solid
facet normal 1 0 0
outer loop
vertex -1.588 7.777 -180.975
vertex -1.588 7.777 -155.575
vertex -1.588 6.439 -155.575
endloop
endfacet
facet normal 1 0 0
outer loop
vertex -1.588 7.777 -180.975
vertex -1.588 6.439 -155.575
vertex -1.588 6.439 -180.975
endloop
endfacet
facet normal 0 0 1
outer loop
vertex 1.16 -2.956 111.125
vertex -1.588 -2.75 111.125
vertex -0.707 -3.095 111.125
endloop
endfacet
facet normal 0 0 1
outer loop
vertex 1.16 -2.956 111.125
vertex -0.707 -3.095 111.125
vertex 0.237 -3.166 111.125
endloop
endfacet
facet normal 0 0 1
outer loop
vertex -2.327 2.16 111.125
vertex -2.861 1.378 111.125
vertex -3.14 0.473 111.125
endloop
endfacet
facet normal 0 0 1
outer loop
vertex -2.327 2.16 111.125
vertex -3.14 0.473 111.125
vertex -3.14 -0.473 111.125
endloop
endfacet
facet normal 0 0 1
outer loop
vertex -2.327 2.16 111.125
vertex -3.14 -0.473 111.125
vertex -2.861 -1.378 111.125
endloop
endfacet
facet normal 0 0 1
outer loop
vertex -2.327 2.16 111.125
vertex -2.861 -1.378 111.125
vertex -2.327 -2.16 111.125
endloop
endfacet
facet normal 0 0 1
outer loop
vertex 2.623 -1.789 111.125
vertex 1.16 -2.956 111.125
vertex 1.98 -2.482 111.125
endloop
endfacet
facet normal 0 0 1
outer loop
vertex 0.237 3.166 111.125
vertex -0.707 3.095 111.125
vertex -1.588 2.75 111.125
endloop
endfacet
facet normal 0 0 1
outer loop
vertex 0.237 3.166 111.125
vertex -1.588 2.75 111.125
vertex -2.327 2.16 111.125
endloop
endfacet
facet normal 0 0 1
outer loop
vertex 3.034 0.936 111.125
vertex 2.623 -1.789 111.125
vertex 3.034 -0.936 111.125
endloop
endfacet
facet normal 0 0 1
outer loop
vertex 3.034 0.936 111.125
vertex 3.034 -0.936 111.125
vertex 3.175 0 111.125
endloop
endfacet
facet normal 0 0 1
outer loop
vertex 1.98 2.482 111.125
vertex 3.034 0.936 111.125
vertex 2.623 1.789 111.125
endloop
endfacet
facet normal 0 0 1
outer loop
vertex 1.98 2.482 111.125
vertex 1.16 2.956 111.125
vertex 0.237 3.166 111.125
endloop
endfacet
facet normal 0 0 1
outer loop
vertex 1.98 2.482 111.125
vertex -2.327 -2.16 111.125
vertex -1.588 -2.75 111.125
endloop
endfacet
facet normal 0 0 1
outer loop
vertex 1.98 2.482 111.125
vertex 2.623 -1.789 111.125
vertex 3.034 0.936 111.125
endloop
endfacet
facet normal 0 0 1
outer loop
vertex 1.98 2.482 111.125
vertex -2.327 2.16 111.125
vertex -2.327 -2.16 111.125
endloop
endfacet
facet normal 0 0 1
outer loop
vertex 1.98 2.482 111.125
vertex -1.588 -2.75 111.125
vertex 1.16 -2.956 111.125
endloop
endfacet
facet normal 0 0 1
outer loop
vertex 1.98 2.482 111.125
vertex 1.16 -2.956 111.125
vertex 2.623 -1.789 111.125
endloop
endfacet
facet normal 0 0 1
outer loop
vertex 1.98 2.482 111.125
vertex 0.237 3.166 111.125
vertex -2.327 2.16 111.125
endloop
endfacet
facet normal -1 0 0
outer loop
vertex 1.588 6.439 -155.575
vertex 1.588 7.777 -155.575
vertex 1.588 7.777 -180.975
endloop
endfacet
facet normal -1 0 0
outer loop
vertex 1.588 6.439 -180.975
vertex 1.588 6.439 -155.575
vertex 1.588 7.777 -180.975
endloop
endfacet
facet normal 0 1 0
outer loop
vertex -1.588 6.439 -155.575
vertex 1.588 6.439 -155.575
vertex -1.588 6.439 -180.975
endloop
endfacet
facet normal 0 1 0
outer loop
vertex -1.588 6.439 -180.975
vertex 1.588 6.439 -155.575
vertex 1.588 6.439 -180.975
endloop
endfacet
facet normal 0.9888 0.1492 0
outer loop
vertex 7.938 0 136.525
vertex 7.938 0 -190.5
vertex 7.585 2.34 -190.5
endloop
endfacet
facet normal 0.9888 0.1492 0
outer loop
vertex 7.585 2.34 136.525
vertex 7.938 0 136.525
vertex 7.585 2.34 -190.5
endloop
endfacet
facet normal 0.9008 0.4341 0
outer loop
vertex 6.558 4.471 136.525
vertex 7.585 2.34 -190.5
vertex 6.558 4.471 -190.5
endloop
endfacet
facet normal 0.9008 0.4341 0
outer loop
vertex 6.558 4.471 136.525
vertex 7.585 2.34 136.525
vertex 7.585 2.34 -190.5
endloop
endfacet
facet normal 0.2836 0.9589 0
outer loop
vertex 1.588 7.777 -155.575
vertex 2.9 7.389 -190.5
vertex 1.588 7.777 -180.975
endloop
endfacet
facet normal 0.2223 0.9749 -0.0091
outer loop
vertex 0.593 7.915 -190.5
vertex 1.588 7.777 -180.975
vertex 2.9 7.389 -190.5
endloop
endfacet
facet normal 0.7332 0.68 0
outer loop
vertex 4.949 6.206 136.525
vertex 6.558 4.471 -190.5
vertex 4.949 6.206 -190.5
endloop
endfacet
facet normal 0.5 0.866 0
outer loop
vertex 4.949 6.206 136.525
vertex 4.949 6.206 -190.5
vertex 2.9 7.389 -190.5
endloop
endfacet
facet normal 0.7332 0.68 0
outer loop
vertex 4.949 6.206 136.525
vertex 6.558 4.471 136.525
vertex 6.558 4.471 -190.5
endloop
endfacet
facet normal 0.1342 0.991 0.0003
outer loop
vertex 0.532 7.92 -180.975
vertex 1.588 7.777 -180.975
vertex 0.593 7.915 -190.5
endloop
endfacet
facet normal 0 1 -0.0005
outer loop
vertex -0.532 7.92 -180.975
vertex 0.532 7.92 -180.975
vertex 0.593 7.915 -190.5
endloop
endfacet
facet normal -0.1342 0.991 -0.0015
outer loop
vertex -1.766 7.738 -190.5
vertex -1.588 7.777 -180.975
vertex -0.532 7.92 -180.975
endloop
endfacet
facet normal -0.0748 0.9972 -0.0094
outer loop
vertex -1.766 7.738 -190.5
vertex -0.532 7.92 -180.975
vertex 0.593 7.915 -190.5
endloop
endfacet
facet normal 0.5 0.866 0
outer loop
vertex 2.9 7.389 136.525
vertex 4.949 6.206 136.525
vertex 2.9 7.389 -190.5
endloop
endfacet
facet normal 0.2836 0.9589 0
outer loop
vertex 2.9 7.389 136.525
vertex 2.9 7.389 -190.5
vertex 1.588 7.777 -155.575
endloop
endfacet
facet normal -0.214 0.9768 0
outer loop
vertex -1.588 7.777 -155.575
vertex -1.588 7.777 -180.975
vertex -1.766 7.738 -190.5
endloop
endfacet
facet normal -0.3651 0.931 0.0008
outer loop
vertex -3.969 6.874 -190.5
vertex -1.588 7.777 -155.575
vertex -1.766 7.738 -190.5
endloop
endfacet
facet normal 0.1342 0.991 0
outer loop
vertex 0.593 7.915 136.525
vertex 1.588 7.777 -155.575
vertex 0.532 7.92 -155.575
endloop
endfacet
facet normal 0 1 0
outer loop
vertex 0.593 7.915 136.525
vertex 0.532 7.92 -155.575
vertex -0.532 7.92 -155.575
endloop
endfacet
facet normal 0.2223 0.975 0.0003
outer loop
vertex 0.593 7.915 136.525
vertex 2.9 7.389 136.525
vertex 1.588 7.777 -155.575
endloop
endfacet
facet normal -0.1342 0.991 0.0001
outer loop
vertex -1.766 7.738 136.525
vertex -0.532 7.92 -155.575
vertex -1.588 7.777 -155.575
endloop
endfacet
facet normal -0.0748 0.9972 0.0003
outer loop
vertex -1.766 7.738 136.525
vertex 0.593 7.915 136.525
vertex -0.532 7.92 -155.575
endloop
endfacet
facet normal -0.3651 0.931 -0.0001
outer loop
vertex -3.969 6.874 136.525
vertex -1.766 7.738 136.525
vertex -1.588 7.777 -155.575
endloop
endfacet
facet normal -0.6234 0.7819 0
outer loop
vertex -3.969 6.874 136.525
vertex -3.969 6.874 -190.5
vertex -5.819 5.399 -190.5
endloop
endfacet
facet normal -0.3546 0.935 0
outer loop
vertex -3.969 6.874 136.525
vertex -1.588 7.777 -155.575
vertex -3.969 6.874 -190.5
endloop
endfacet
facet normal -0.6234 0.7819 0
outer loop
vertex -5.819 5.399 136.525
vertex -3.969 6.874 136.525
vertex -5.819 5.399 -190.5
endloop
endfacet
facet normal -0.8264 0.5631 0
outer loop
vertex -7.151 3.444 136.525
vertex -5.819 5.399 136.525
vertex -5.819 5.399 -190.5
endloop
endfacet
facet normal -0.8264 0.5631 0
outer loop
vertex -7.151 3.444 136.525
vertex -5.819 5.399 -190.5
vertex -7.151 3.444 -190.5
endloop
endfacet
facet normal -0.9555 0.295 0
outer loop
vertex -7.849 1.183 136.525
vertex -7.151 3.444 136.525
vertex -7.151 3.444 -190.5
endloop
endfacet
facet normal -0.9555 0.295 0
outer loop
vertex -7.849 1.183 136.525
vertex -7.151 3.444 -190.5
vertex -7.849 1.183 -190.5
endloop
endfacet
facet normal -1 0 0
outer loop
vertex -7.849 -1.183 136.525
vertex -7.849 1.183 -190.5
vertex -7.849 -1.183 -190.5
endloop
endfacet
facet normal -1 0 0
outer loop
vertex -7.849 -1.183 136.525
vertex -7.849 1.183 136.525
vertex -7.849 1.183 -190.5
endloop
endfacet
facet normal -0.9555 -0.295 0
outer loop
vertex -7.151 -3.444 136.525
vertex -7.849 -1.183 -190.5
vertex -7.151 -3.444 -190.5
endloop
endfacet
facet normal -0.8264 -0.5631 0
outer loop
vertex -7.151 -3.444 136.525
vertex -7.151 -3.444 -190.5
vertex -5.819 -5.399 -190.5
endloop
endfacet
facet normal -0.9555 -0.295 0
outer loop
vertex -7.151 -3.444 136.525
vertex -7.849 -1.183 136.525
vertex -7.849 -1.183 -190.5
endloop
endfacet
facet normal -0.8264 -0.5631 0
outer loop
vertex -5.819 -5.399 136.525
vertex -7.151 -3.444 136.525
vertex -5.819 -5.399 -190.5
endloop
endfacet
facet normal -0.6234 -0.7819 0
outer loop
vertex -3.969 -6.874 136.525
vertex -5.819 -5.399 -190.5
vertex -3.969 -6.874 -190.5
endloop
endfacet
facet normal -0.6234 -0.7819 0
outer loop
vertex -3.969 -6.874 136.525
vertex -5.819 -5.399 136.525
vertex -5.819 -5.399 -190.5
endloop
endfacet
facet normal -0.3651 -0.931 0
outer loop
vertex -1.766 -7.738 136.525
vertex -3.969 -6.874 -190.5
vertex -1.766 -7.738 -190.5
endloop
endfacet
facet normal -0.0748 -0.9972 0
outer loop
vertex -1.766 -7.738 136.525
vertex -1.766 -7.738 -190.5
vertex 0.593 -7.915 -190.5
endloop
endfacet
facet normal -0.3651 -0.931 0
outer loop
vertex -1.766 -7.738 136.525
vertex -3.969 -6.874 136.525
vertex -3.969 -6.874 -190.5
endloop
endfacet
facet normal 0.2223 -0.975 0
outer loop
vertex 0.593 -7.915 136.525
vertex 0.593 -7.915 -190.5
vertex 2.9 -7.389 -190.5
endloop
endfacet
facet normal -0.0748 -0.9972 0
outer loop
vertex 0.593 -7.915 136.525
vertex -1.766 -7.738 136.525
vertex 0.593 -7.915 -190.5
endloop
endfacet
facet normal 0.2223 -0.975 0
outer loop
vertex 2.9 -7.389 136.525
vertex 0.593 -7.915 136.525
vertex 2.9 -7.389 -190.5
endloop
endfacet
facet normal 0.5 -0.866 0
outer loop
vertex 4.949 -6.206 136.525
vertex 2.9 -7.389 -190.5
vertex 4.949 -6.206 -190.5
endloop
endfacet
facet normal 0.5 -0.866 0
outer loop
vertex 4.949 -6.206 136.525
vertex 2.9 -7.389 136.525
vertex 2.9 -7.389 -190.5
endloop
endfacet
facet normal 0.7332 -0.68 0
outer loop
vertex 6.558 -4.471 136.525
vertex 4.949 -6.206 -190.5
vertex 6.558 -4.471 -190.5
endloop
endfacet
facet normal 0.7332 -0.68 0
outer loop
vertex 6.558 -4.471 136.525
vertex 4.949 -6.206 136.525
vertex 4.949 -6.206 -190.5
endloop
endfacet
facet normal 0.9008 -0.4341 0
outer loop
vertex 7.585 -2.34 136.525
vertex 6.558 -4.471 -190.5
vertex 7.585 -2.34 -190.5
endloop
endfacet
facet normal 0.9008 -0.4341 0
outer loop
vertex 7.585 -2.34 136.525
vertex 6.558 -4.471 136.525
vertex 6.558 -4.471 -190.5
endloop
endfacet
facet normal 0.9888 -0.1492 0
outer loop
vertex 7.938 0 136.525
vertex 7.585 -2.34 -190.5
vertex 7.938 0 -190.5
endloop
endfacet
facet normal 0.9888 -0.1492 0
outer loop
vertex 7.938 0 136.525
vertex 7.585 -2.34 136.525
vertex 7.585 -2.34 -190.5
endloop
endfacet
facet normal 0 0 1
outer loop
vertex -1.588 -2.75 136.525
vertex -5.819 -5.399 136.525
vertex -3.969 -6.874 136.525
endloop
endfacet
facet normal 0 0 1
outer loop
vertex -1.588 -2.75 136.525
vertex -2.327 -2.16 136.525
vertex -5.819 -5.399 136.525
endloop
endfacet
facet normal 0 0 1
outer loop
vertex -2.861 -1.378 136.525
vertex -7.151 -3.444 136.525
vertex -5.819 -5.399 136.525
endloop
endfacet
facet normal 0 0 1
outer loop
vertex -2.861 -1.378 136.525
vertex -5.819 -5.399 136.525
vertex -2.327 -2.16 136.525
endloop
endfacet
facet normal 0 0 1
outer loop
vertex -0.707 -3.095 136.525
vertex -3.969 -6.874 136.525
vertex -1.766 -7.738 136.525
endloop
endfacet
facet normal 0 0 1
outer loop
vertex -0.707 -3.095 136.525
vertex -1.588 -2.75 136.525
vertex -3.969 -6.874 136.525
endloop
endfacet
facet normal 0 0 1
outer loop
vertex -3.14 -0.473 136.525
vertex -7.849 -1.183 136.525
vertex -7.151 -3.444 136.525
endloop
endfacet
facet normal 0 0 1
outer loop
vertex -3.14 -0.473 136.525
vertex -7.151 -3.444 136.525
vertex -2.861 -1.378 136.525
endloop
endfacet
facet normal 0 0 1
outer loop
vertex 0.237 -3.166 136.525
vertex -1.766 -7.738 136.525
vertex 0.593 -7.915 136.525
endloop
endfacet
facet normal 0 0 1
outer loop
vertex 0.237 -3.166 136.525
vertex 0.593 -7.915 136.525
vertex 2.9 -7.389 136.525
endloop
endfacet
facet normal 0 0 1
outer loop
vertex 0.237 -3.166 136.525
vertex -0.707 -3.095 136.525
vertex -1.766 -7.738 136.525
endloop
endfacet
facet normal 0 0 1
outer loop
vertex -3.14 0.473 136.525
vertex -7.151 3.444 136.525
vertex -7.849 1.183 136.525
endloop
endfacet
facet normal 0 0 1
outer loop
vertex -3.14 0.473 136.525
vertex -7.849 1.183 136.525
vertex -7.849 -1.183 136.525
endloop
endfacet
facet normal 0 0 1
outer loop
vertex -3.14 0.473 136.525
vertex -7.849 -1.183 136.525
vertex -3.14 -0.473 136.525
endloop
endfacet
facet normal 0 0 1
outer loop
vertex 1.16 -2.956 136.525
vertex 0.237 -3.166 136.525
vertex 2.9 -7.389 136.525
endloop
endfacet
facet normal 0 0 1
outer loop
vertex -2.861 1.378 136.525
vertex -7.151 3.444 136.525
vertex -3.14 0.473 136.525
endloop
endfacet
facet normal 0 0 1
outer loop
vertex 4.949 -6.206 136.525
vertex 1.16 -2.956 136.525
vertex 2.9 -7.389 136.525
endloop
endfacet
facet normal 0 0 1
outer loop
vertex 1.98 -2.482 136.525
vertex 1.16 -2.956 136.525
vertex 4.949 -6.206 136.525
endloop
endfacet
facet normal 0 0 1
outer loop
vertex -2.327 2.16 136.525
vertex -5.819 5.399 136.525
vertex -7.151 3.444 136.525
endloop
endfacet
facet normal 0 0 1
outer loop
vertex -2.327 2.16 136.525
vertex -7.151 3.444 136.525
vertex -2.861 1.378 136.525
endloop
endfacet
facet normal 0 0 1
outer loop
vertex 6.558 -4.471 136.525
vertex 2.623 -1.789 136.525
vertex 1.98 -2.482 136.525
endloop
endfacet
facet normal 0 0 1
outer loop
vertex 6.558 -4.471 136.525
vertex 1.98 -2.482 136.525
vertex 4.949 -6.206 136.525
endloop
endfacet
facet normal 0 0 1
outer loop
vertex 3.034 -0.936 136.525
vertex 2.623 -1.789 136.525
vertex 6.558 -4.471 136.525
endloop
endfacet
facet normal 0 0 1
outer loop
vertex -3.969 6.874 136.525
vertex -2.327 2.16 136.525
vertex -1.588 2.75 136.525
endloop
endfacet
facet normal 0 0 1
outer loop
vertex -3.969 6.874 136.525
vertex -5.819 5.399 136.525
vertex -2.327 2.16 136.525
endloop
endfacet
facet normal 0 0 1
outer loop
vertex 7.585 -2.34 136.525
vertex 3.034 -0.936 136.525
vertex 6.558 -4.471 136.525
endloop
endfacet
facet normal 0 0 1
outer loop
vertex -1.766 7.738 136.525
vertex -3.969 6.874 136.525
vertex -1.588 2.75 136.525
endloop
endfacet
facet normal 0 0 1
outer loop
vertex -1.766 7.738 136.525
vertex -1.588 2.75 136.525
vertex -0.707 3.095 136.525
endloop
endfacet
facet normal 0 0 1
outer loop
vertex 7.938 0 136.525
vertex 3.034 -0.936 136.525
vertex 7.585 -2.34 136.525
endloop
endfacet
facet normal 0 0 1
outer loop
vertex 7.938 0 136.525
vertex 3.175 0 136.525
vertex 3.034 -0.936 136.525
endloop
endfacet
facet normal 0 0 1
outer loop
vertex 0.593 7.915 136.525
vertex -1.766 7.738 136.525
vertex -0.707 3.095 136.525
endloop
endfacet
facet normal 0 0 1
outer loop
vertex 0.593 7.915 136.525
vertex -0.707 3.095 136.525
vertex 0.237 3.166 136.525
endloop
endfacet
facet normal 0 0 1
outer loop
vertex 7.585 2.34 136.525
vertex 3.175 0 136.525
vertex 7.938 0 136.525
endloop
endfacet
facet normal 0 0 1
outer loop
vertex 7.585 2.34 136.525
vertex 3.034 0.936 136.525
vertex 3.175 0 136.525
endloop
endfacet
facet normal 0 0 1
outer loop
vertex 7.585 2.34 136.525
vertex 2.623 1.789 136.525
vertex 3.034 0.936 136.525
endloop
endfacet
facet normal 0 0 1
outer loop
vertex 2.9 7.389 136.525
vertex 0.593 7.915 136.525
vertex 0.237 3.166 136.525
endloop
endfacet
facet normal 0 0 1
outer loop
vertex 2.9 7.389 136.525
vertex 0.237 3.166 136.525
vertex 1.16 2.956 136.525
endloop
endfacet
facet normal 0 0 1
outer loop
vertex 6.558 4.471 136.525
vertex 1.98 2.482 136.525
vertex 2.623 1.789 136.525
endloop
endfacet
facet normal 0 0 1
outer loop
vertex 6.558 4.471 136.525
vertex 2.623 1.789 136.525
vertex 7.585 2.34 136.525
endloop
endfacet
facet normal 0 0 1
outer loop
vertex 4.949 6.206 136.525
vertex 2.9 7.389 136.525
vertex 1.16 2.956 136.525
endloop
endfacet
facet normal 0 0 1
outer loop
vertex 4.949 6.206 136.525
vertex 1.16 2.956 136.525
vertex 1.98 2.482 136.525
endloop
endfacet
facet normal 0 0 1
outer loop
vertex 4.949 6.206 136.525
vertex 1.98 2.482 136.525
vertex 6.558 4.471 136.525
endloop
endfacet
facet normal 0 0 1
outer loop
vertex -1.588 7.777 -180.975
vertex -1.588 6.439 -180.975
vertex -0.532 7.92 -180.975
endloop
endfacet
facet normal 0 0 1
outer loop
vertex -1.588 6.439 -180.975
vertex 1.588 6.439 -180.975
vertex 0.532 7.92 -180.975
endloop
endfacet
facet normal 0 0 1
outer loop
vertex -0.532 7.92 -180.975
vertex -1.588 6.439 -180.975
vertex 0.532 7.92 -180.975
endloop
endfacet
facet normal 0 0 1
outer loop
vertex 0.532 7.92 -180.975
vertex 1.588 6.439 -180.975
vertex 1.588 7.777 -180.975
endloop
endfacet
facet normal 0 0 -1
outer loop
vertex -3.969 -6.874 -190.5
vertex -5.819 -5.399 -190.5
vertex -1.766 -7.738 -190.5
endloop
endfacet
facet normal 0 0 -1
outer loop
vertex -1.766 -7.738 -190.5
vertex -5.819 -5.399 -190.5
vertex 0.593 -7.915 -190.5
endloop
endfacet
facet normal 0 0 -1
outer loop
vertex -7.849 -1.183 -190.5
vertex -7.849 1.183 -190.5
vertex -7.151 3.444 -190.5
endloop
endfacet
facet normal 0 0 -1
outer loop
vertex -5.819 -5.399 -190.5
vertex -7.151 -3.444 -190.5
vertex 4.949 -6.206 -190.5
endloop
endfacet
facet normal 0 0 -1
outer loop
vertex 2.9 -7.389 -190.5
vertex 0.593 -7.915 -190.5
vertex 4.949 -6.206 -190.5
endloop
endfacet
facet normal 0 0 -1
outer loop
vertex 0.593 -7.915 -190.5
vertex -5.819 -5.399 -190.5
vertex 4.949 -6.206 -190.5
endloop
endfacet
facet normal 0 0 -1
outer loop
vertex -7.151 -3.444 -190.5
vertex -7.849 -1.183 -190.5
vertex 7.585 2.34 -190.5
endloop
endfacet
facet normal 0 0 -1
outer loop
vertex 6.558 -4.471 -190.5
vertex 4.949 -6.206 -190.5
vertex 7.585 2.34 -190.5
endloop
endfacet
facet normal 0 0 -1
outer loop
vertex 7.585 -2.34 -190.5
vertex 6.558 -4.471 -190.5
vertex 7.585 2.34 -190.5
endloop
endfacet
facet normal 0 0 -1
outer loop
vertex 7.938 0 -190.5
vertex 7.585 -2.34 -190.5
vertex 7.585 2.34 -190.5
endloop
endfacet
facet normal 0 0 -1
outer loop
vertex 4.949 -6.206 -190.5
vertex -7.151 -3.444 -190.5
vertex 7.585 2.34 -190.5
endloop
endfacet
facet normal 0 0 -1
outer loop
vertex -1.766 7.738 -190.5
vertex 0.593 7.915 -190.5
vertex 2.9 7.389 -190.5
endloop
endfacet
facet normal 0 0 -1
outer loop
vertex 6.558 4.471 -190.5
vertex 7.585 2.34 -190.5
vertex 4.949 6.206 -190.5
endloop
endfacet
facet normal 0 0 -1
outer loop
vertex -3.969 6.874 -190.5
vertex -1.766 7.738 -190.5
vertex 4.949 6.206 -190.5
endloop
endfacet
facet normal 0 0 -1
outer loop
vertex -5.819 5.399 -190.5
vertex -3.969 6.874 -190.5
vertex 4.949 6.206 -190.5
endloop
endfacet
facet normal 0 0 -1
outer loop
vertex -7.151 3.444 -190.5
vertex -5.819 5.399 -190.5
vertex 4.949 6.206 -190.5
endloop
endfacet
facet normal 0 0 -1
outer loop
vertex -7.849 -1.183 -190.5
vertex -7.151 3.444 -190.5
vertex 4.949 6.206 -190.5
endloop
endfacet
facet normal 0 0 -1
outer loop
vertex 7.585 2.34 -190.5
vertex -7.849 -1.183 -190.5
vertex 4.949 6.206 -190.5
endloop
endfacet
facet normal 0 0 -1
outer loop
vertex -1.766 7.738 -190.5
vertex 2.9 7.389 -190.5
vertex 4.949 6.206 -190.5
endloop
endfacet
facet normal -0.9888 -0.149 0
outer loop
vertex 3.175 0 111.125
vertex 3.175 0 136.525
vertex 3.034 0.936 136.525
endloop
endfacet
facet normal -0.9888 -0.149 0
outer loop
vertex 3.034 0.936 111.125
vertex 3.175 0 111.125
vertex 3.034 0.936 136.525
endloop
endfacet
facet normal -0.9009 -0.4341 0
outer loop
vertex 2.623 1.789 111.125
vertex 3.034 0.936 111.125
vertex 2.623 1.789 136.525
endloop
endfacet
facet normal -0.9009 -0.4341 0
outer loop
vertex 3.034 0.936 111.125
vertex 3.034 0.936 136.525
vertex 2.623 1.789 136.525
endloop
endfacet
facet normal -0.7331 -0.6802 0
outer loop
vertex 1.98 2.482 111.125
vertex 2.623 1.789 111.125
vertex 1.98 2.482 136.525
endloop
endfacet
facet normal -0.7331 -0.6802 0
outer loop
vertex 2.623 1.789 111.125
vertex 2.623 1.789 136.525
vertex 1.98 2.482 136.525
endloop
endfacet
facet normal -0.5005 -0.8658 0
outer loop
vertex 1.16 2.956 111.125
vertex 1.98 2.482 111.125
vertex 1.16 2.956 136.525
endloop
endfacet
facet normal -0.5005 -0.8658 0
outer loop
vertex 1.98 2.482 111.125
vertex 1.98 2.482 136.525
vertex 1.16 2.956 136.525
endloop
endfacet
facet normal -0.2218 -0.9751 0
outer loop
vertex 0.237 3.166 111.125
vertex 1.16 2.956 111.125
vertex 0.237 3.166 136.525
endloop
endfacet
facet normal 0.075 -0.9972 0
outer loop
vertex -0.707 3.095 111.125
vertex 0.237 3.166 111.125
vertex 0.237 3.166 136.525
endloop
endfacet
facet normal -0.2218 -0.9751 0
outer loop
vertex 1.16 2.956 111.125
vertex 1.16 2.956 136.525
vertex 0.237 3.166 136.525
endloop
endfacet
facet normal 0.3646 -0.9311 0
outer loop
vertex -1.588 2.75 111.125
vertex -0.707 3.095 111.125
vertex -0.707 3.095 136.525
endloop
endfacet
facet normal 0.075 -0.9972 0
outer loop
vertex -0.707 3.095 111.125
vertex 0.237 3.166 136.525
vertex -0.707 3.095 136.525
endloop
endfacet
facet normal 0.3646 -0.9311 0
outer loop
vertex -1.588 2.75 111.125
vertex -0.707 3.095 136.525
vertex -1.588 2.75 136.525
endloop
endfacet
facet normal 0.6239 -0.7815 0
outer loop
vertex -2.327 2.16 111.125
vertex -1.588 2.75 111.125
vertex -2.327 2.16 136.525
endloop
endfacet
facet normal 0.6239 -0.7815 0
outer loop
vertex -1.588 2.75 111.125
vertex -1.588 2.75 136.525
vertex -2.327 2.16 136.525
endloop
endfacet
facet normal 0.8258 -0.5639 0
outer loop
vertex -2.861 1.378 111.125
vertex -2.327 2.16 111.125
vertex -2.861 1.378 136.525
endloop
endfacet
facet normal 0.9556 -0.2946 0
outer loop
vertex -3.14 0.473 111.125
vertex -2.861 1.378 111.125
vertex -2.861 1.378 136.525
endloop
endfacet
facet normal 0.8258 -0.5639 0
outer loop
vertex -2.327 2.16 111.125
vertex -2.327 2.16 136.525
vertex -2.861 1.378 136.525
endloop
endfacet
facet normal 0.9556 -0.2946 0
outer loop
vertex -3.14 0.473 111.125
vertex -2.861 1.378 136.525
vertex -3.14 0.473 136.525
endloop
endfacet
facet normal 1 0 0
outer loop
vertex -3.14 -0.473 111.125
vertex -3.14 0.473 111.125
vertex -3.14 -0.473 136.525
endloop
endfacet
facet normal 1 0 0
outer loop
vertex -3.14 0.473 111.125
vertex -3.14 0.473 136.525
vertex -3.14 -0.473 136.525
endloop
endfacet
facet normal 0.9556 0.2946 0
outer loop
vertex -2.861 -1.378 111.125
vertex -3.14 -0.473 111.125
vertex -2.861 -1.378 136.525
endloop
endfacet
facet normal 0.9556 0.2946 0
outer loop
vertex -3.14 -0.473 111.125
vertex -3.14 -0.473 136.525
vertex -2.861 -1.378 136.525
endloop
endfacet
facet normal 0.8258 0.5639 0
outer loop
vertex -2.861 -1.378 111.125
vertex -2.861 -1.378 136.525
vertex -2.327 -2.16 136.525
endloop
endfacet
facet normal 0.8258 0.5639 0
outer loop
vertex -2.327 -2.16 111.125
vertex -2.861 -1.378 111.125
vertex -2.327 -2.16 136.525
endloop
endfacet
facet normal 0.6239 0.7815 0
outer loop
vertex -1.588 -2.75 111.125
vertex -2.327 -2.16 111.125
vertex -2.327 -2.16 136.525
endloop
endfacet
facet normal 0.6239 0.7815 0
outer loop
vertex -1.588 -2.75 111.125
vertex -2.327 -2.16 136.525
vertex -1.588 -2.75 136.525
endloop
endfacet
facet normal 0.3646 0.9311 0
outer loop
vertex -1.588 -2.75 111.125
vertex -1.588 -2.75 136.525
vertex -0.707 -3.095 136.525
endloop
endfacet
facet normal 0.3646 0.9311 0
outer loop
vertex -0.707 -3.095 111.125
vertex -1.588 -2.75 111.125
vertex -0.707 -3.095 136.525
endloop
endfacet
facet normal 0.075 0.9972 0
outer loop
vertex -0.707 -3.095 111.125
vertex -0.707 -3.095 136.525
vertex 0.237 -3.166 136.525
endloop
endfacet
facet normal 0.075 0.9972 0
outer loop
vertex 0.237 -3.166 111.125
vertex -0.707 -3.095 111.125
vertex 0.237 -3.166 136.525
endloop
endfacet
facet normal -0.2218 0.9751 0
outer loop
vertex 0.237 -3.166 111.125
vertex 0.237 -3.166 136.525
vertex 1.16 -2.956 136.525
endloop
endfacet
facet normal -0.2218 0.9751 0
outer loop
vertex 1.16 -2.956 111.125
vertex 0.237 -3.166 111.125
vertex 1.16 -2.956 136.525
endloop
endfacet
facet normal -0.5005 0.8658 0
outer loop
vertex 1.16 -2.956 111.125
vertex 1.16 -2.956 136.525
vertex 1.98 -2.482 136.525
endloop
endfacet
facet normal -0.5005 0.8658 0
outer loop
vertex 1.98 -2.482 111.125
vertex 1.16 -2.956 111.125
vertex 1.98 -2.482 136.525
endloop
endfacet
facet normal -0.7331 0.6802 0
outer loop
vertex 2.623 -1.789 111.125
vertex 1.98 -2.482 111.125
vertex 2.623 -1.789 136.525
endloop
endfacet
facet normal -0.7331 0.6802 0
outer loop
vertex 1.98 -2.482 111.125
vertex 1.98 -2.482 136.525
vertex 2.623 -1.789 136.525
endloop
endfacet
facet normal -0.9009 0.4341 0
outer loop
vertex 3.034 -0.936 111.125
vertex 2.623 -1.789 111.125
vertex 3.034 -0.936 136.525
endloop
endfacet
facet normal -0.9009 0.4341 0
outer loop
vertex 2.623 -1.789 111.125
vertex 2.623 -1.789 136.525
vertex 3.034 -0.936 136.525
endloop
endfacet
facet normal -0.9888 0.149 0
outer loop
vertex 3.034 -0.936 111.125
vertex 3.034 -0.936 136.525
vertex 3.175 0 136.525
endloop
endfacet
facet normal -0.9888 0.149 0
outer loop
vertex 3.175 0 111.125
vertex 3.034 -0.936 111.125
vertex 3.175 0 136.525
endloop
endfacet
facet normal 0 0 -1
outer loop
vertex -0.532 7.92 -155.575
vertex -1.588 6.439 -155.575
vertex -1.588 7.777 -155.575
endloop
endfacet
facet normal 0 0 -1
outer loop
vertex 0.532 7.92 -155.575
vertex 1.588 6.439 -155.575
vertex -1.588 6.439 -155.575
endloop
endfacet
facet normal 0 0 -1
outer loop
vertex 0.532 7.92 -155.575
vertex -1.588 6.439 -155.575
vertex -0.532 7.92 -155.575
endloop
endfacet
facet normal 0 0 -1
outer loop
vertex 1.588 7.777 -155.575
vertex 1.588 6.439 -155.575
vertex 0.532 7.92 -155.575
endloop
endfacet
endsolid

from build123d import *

# Parameters (mm, degrees)
EXTRUDE1_DEPTH      = 136.525
EXTRUDE1_DEPTH_BACK = 190.5
SKETCH1_R           = 7.9375
SKETCH2_R           = 3.175
CUT_EXTRUDE1_DEPTH  = 25.4
SKETCH3_W           = 25.4
SKETCH3_H           = 3.175
CUT_EXTRUDE2_DEPTH  = 1.5875


with BuildPart() as part:
    # Sketch1 → Extrude1 (new, two sides: drawn at the far end of the back side and taken through both)
    with BuildSketch(Plane.XY.offset(-EXTRUDE1_DEPTH_BACK)):
        Circle(SKETCH1_R)
    extrude(amount=EXTRUDE1_DEPTH + EXTRUDE1_DEPTH_BACK)

    # Sketch2 → Cut-Extrude1 (cut)
    with BuildSketch(Plane.XY.offset(136.525)):
        Circle(SKETCH2_R)
    extrude(amount=-CUT_EXTRUDE1_DEPTH, mode=Mode.SUBTRACT)

    # Sketch3 → Cut-Extrude2 (cut, symmetric)
    with BuildSketch(Plane(origin=(0, 0, 0), x_dir=(0, 0, -1), z_dir=(1, 0, 0))):
        with Locations((168.275, 8.0264)):
            Rectangle(SKETCH3_W, SKETCH3_H)
    extrude(amount=CUT_EXTRUDE2_DEPTH, both=True, mode=Mode.SUBTRACT)


solid = part.part
